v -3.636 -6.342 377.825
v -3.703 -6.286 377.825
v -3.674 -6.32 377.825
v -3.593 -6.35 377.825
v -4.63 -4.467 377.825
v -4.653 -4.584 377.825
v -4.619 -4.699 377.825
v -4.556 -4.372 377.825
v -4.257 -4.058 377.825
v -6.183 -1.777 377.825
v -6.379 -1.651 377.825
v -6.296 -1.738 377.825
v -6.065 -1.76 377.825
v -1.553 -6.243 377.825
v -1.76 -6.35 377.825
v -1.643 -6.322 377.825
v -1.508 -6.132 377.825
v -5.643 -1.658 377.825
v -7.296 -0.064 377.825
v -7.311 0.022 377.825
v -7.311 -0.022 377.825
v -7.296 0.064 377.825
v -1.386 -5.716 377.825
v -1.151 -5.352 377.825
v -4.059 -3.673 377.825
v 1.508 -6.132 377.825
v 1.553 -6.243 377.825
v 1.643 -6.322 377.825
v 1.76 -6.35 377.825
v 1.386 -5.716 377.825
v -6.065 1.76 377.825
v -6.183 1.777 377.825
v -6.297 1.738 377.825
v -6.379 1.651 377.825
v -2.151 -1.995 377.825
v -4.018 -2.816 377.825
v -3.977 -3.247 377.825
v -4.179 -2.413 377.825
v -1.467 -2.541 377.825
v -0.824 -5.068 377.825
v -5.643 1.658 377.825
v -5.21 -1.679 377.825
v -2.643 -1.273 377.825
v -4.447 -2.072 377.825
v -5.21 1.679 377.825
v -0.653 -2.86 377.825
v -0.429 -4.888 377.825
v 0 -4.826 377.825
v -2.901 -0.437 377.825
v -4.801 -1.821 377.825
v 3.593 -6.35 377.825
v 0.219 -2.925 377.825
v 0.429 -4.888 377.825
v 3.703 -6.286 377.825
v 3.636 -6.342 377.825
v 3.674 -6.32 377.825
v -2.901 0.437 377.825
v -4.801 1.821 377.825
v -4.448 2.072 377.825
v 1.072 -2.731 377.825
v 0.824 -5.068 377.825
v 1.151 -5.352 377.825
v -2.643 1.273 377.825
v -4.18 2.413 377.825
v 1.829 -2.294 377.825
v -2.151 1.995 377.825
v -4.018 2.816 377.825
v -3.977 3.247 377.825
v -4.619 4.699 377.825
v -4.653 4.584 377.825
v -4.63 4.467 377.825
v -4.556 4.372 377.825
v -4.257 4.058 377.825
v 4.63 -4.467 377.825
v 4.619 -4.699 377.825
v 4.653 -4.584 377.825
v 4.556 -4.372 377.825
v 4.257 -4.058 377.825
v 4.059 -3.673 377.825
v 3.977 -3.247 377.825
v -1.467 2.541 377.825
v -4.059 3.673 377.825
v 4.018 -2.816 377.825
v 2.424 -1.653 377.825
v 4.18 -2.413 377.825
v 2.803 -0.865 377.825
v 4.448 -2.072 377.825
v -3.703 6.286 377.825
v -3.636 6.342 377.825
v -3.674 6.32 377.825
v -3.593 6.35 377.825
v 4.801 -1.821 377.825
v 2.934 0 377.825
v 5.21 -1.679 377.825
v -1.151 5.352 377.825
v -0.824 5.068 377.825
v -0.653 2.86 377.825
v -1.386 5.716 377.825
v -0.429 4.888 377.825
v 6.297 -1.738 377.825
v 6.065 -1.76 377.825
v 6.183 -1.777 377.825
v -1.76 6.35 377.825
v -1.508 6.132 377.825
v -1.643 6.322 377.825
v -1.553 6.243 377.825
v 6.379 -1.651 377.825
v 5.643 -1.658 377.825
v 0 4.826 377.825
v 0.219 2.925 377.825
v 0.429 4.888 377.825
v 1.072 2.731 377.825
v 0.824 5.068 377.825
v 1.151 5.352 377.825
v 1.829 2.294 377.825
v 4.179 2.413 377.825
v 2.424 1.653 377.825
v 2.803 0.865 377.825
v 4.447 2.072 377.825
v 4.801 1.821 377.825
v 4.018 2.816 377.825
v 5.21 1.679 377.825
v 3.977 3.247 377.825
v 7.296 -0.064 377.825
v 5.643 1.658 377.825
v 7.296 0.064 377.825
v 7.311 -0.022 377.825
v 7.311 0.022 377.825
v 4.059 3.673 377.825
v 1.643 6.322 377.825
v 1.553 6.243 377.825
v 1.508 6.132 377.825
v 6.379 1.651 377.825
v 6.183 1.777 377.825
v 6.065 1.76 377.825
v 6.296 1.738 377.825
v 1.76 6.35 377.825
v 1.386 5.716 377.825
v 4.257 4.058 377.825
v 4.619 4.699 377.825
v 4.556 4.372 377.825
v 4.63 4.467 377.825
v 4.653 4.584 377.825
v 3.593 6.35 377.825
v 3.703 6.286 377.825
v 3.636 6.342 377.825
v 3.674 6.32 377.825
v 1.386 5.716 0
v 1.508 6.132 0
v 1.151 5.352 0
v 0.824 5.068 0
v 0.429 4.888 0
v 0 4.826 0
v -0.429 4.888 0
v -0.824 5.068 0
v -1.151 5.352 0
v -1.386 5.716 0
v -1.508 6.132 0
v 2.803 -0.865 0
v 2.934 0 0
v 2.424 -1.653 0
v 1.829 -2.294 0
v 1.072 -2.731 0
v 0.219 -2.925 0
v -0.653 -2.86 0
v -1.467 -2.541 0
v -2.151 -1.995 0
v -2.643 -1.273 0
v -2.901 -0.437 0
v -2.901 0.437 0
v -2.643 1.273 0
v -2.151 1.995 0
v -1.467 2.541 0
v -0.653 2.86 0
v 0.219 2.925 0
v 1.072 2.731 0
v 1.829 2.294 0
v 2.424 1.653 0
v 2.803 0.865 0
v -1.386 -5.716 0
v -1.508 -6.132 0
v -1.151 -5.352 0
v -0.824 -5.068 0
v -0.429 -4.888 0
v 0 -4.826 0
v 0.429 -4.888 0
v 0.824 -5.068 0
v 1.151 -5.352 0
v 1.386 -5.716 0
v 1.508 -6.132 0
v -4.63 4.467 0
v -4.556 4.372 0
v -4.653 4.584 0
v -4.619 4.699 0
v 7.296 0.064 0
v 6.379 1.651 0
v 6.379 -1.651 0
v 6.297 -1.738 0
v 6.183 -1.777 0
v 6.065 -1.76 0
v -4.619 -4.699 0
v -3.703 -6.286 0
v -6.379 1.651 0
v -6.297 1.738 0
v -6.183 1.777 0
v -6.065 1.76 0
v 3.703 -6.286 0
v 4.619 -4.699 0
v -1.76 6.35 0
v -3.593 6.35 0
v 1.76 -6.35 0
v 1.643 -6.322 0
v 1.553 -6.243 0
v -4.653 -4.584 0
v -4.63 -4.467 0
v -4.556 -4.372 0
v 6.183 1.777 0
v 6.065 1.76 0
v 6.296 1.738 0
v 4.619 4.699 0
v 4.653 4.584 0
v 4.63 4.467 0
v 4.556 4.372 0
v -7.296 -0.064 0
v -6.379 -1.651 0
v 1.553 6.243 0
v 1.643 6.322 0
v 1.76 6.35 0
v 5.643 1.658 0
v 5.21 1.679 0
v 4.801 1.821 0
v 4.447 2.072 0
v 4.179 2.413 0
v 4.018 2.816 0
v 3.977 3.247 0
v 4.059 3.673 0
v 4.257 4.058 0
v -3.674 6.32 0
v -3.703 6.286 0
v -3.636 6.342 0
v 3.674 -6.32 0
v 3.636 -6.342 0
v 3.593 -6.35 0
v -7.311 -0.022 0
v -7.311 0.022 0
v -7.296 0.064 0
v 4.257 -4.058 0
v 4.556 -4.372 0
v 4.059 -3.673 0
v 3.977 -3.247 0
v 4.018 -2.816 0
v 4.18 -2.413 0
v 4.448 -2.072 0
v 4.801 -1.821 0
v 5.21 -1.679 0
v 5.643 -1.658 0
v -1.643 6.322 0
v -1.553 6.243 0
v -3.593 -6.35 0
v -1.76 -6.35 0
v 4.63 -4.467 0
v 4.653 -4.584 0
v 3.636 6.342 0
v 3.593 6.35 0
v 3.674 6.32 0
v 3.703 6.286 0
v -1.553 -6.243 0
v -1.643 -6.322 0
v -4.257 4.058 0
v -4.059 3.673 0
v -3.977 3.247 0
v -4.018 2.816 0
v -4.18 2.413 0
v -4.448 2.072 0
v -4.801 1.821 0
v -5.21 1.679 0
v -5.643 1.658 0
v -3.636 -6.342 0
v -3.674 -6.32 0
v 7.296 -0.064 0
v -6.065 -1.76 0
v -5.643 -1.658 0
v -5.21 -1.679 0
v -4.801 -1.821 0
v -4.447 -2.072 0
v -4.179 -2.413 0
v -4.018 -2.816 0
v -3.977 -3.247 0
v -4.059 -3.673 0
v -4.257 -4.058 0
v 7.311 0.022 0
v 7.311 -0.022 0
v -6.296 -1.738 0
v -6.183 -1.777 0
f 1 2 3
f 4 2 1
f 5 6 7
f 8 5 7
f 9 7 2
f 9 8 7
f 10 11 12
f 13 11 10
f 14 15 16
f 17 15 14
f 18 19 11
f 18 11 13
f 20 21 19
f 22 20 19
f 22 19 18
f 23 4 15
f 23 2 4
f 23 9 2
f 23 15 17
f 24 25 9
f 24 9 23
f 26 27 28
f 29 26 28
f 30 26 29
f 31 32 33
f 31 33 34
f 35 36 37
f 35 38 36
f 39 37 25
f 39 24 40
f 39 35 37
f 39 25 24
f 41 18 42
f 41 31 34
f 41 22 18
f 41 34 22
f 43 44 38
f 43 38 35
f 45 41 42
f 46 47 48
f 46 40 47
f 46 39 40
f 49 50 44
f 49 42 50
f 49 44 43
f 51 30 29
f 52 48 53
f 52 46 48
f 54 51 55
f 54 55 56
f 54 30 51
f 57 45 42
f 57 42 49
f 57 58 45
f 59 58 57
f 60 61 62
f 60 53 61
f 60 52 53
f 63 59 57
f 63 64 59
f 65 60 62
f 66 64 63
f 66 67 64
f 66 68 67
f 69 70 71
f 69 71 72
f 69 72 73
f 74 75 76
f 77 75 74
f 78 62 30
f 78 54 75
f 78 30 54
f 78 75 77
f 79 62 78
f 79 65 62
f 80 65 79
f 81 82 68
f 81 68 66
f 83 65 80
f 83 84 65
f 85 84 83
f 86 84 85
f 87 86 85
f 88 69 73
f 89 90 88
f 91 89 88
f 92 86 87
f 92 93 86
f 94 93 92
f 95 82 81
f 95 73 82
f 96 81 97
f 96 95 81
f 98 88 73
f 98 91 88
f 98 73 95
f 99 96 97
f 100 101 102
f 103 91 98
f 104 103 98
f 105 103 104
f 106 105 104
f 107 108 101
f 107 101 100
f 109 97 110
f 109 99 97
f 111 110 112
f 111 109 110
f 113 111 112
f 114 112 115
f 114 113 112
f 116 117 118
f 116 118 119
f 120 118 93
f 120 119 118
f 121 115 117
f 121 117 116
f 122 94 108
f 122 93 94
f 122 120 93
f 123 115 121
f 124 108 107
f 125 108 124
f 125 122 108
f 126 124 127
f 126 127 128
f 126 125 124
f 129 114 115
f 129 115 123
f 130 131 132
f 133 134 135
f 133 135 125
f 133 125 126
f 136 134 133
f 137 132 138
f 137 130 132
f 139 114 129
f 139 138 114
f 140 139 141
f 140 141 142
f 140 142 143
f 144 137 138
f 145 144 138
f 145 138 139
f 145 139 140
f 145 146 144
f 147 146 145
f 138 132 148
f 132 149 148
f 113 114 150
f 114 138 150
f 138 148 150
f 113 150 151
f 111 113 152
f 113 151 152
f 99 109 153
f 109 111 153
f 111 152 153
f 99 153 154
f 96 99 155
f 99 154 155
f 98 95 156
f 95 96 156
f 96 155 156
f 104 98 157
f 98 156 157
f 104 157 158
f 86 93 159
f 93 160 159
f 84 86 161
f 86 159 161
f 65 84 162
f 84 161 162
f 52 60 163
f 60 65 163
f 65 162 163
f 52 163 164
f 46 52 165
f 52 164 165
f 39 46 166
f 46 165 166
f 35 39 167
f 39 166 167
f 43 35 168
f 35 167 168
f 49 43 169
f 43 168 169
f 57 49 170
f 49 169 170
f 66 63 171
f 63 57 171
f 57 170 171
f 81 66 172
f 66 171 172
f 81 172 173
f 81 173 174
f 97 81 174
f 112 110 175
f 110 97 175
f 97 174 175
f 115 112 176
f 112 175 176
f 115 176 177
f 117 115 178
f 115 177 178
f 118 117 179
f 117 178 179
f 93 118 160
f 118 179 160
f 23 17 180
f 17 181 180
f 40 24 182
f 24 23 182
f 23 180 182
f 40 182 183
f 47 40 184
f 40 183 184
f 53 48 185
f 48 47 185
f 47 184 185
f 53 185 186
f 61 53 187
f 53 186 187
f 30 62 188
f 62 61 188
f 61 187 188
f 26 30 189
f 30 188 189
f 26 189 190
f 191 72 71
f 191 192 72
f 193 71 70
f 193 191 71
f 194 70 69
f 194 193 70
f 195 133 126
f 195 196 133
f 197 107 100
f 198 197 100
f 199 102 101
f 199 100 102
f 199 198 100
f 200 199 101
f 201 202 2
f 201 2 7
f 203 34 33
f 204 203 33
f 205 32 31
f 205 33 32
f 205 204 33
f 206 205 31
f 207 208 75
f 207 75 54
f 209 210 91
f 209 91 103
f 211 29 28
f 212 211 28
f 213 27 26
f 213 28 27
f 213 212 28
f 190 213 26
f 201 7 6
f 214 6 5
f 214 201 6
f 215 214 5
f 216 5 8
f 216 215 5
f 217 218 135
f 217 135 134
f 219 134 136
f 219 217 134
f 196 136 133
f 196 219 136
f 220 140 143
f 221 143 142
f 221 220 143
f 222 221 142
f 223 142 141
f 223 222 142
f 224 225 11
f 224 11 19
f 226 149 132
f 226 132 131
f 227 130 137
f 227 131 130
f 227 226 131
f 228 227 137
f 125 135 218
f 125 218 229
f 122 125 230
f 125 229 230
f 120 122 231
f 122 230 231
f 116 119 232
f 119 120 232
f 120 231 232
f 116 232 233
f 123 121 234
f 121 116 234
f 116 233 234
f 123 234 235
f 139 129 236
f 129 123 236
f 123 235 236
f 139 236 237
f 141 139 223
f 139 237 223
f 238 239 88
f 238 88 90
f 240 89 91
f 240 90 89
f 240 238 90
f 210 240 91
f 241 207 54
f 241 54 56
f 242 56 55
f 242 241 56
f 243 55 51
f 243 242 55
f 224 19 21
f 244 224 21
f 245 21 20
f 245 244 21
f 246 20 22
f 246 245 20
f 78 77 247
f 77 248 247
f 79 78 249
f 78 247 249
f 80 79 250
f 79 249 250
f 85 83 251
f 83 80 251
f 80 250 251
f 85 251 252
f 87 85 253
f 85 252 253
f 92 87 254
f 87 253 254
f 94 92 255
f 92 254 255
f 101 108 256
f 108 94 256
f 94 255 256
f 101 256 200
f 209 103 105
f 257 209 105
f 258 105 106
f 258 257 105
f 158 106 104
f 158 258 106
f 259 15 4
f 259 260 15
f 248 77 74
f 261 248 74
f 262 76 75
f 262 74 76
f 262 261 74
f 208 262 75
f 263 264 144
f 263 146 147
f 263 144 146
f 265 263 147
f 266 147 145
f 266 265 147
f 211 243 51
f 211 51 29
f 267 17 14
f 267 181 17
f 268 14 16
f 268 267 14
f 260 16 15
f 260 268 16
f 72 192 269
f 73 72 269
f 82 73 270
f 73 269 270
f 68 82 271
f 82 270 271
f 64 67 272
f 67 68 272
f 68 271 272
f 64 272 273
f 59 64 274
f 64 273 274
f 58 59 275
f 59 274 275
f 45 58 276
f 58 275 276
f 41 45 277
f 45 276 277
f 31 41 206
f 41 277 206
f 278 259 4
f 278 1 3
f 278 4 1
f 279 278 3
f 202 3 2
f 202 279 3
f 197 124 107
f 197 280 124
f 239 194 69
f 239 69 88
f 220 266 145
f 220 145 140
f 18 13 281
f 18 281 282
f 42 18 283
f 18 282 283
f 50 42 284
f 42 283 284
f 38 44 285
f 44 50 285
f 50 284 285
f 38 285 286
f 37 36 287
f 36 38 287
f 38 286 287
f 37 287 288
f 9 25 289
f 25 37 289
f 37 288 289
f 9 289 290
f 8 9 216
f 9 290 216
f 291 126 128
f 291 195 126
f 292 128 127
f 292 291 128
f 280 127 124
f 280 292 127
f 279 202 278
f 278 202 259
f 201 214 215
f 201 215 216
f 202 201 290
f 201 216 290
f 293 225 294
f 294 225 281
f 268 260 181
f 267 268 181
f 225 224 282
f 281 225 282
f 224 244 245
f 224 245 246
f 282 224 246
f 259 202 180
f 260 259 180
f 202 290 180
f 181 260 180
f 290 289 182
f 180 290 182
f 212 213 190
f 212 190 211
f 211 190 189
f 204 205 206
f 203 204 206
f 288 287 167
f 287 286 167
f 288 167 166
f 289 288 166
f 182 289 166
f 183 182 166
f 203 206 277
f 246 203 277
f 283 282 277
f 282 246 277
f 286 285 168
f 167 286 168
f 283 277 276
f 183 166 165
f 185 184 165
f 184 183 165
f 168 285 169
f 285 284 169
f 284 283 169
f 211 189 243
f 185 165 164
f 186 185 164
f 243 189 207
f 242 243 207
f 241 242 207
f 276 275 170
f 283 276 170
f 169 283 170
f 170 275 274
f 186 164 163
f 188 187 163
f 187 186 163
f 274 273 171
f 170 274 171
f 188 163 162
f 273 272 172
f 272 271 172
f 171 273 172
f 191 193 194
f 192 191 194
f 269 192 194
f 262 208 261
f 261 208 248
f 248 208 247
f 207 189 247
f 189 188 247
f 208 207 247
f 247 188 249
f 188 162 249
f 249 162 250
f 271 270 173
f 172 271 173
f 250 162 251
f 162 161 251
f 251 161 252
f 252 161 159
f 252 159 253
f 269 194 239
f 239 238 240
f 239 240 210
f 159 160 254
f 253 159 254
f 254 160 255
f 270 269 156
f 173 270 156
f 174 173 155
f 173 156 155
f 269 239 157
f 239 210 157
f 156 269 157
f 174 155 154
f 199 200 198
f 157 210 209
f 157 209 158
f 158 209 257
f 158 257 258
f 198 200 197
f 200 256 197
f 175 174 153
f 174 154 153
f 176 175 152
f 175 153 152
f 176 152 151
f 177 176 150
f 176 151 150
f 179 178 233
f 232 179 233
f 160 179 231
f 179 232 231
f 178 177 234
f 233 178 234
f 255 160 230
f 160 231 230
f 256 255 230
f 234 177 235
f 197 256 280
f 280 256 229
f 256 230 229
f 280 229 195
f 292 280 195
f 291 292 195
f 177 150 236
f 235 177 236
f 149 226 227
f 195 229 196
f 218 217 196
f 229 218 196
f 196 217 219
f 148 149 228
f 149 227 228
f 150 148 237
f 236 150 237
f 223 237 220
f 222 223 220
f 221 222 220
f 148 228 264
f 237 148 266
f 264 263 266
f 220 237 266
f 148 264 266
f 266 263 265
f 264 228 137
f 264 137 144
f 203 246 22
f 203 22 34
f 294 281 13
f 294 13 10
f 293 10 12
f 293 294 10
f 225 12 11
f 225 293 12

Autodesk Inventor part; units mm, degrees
ref_plane "YZ Plane" through (0, 0, 0) normal (1, 0, 0) x (0, 1, 0)
ref_plane "XZ Plane" through (0, 0, 0) normal (0, 1, 0) x (-1, 0, 0)
ref_plane "XY Plane" through (0, 0, 0) normal (0, 0, 1) x (1, 0, 0)
sketch "CrossHexProfile" plane through (0, 0, 0) normal (0, 0, 1) x (1, 0, 0)
  arc A0 (1.7598, 0) -> (1.5084, -0.2177) centre (1.7598, -0.254) ccw
  line L0 (1.7598, 0) -> (3.5929, 0)
  arc A1 (3.7028, -0.0635) -> (3.5929, 0) centre (3.5929, -0.127) ccw
  line L1 (3.7028, -0.0635) -> (4.6194, -1.651)
  arc A2 (4.5565, -1.9776) -> (4.6194, -1.651) centre (4.3994, -1.778) ccw
  arc A3 (4.5565, -1.9776) -> (6.0649, -4.5901) centre (5.4993, -3.175) ccw
  arc A4 (-1.5084, -0.2177) -> (1.5084, -0.2177) centre (0, 0) ccw
  arc A5 (-4.5565, -10.7224) -> (-4.6194, -11.049) centre (-4.3994, -10.922) ccw
  arc A6 (-4.5565, -10.7224) -> (-6.0649, -8.1099) centre (-5.4993, -9.525) ccw
  arc A7 (-6.3791, -8.001) -> (-6.0649, -8.1099) centre (-6.1592, -7.874) ccw
  line L2 (-6.3791, -8.001) -> (-7.2957, -6.4135)
  arc A8 (-7.2957, -6.2865) -> (-7.2957, -6.4135) centre (-7.1857, -6.35) ccw
  arc A9 (-6.0649, -4.5901) -> (-6.3791, -4.699) centre (-6.1592, -4.826) ccw
  line L3 (-7.2957, -6.2865) -> (-6.3791, -4.699)
  arc A10 (-1.5084, -0.2177) -> (-1.7598, 0) centre (-1.7598, -0.254) ccw
  line L4 (-3.5929, 0) -> (-1.7598, 0)
  arc A11 (-3.5929, 0) -> (-3.7028, -0.0635) centre (-3.5929, -0.127) ccw
  line L5 (-4.6194, -1.651) -> (-3.7028, -0.0635)
  arc A12 (-4.6194, -1.651) -> (-4.5565, -1.9776) centre (-4.3994, -1.778) ccw
  arc A13 (-6.0649, -4.5901) -> (-4.5565, -1.9776) centre (-5.4993, -3.175) ccw
  line L6 (-3.7028, -12.6365) -> (-4.6194, -11.049)
  circle A14 centre (0, -6.35) radius 2.9337
  arc A15 (-3.7028, -12.6365) -> (-3.5929, -12.7) centre (-3.5929, -12.573) ccw
  line L7 (-1.7598, -12.7) -> (-3.5929, -12.7)
  arc A16 (-1.7598, -12.7) -> (-1.5084, -12.4823) centre (-1.7598, -12.446) ccw
  arc A17 (1.5084, -12.4823) -> (-1.5084, -12.4823) centre (0, -12.7) ccw
  arc A18 (1.5084, -12.4823) -> (1.7598, -12.7) centre (1.7598, -12.446) ccw
  line L8 (3.5929, -12.7) -> (1.7598, -12.7)
  arc A19 (3.5929, -12.7) -> (3.7028, -12.6365) centre (3.5929, -12.573) ccw
  line L9 (4.6194, -11.049) -> (3.7028, -12.6365)
  arc A20 (6.3791, -4.699) -> (6.0649, -4.5901) centre (6.1592, -4.826) ccw
  line L10 (6.3791, -4.699) -> (7.2957, -6.2865)
  arc A21 (7.2957, -6.4135) -> (7.2957, -6.2865) centre (7.1857, -6.35) ccw
  arc A22 (6.0649, -8.1099) -> (6.3791, -8.001) centre (6.1592, -7.874) ccw
  line L11 (7.2957, -6.4135) -> (6.3791, -8.001)
  arc A23 (4.6194, -11.049) -> (4.5565, -10.7224) centre (4.3994, -10.922) ccw
  arc A24 (6.0649, -8.1099) -> (4.5565, -10.7224) centre (5.4993, -9.525) ccw
  point P0 (0, -6.35)
sketch "Sketch1" plane through (0, 0, 0) normal (0, 0, 1) x (1, 0, 0)
  arc A0 (1.7598, 6.35) -> (1.5084, 6.1323) centre (1.7598, 6.096) ccw
  line L0 (1.7598, 6.35) -> (3.5929, 6.35)
  arc A1 (3.7028, 6.2865) -> (3.5929, 6.35) centre (3.5929, 6.223) ccw
  line L1 (3.7028, 6.2865) -> (4.6194, 4.699)
  arc A2 (4.5565, 4.3724) -> (4.6194, 4.699) centre (4.3994, 4.572) ccw
  arc A3 (4.5565, 4.3724) -> (6.0649, 1.7599) centre (5.4993, 3.175) ccw
  arc A4 (-1.5084, 6.1323) -> (1.5084, 6.1323) centre (0, 6.35) ccw
  arc A5 (-4.5565, -4.3724) -> (-4.6194, -4.699) centre (-4.3994, -4.572) ccw
  arc A6 (-4.5565, -4.3724) -> (-6.0649, -1.7599) centre (-5.4993, -3.175) ccw
  arc A7 (-6.3791, -1.651) -> (-6.0649, -1.7599) centre (-6.1592, -1.524) ccw
  line L2 (-6.3791, -1.651) -> (-7.2957, -0.0635)
  arc A8 (-7.2957, 0.0635) -> (-7.2957, -0.0635) centre (-7.1857, 0) ccw
  arc A9 (-6.0649, 1.7599) -> (-6.3791, 1.651) centre (-6.1592, 1.524) ccw
  line L3 (-7.2957, 0.0635) -> (-6.3791, 1.651)
  arc A10 (-1.5084, 6.1323) -> (-1.7598, 6.35) centre (-1.7598, 6.096) ccw
  line L4 (-3.5929, 6.35) -> (-1.7598, 6.35)
  arc A11 (-3.5929, 6.35) -> (-3.7028, 6.2865) centre (-3.5929, 6.223) ccw
  line L5 (-4.6194, 4.699) -> (-3.7028, 6.2865)
  arc A12 (-4.6194, 4.699) -> (-4.5565, 4.3724) centre (-4.3994, 4.572) ccw
  arc A13 (-6.0649, 1.7599) -> (-4.5565, 4.3724) centre (-5.4993, 3.175) ccw
  line L6 (-3.7028, -6.2865) -> (-4.6194, -4.699)
  circle A14 centre (0, 0) radius 2.9337
  arc A15 (-3.7028, -6.2865) -> (-3.5929, -6.35) centre (-3.5929, -6.223) ccw
  line L7 (-1.7598, -6.35) -> (-3.5929, -6.35)
  arc A16 (-1.7598, -6.35) -> (-1.5084, -6.1323) centre (-1.7598, -6.096) ccw
  arc A17 (1.5084, -6.1323) -> (-1.5084, -6.1323) centre (0, -6.35) ccw
  arc A18 (1.5084, -6.1323) -> (1.7598, -6.35) centre (1.7598, -6.096) ccw
  line L8 (3.5929, -6.35) -> (1.7598, -6.35)
  arc A19 (3.5929, -6.35) -> (3.7028, -6.2865) centre (3.5929, -6.223) ccw
  line L9 (4.6194, -4.699) -> (3.7028, -6.2865)
  arc A20 (6.3791, 1.651) -> (6.0649, 1.7599) centre (6.1592, 1.524) ccw
  line L10 (6.3791, 1.651) -> (7.2957, 0.0635)
  arc A21 (7.2957, -0.0635) -> (7.2957, 0.0635) centre (7.1857, 0) ccw
  arc A22 (6.0649, -1.7599) -> (6.3791, -1.651) centre (6.1592, -1.524) ccw
  line L11 (7.2957, -0.0635) -> (6.3791, -1.651)
  arc A23 (4.6194, -4.699) -> (4.5565, -4.3724) centre (4.3994, -4.572) ccw
  arc A24 (6.0649, -1.7599) -> (4.5565, -4.3724) centre (5.4993, -3.175) ccw
  point P0 (0, 0)
extrude "Extrusion1" add sketch "Sketch1" along normal blind 377.825
properties part number "CrossHex 1825" material "Aluminum-6061"
